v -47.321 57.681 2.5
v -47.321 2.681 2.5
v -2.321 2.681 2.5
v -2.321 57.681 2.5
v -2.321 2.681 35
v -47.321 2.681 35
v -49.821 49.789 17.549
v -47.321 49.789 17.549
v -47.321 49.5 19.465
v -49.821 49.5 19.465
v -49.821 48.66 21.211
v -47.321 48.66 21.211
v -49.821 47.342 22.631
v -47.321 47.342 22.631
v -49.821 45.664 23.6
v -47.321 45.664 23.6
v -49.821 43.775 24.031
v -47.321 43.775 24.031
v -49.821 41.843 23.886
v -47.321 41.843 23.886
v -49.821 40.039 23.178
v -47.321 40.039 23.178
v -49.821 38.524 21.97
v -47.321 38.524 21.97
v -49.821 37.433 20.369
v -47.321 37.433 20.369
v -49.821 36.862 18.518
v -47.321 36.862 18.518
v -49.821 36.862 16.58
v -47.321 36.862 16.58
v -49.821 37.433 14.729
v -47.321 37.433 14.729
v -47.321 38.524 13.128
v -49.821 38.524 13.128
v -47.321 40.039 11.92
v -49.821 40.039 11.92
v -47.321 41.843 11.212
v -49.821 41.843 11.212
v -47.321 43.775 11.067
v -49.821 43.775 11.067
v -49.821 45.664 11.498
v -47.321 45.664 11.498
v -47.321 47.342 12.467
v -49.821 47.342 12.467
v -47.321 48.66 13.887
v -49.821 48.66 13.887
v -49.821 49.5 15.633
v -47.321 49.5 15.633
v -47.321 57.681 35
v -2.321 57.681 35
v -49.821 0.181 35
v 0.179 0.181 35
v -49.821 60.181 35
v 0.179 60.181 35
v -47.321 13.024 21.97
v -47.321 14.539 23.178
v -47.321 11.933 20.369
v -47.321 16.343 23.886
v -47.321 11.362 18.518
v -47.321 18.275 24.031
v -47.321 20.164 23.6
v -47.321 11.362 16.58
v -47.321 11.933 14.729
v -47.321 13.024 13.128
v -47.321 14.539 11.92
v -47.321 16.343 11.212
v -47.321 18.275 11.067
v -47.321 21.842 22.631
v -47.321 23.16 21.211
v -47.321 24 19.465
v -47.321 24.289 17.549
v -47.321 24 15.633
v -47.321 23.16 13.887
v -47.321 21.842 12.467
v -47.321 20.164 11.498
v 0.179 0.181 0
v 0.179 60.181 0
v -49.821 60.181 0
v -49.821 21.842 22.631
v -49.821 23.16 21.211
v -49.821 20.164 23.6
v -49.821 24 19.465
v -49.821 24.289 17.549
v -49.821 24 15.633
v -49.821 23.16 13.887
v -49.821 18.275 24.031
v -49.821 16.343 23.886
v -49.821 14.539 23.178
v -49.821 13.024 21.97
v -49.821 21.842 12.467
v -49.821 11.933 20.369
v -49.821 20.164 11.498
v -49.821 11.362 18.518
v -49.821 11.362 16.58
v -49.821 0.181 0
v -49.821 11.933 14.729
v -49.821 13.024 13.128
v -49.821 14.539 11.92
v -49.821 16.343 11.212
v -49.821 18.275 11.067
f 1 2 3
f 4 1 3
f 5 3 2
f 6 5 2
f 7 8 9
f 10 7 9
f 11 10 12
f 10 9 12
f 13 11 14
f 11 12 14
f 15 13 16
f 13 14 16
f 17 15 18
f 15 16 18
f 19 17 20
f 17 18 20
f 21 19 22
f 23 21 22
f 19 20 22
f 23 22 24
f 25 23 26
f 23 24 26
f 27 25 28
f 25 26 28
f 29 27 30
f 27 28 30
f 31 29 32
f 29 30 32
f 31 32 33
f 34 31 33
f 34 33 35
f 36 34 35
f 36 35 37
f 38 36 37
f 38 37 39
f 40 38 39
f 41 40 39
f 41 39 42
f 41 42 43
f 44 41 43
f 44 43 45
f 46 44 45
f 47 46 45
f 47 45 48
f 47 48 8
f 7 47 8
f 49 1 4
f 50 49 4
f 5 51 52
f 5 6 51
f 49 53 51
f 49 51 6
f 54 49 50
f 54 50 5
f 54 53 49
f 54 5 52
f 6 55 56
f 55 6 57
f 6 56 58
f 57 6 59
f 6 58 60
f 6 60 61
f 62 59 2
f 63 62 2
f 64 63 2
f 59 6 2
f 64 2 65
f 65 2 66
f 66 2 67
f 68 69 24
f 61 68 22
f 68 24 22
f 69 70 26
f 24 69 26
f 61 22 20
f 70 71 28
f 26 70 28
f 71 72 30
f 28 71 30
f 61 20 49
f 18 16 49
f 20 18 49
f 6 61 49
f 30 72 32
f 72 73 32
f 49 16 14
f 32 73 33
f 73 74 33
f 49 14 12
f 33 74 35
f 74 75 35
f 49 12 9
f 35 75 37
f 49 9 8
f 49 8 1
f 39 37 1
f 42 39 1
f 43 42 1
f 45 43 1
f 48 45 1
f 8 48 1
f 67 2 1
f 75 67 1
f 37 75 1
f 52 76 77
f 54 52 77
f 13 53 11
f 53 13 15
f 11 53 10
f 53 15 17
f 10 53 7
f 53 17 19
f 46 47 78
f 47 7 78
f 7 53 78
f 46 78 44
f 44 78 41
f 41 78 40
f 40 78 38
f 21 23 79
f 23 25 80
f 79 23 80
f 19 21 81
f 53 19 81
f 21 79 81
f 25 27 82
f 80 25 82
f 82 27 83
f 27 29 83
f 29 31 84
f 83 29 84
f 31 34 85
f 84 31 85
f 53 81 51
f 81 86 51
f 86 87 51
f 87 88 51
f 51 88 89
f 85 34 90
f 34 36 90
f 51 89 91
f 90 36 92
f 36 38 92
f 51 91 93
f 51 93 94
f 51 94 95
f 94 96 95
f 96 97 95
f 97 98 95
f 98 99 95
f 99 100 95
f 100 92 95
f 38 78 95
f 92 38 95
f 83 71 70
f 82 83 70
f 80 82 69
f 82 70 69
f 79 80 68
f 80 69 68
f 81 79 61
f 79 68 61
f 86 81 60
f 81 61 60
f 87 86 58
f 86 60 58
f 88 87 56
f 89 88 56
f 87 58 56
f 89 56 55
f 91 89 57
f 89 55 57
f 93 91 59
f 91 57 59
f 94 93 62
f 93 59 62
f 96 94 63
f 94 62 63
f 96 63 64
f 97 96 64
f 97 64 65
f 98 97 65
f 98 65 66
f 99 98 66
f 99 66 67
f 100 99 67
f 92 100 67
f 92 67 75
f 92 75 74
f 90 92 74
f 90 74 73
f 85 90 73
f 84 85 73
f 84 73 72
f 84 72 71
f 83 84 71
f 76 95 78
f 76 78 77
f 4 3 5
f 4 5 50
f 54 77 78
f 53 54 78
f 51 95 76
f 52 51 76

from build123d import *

# Parameters (mm, degrees)
F0_W     = 2.5
F0_H     = 55
F1_DEPTH = 35
F0_W_2   = 45
F2_DEPTH = 2.5
F4_D     = 13
F4_DEPTH = 12
F5_D     = 13
F5_DEPTH = 12


with BuildPart() as f1:
    # F0 (on Top) → F1 (new body)
    with BuildSketch(Plane.XY):
        Polygon((-47.320926, 2.681236), (-49.820926, 2.681236), (-49.820926, 0.181236), (0.179074, 0.181236), (0.179074, 2.681236), (-2.320926, 2.681236), align=None)
        with Locations((-48.570926, 30.181236)):
            Rectangle(F0_W, F0_H)
        Polygon((0.179074, 60.181236), (-49.820926, 60.181236), (-49.820926, 57.681236), (-47.320926, 57.681236), (-2.320926, 57.681236), (0.179074, 57.681236), align=None)
        with Locations((-1.070926, 30.181236)):
            Rectangle(F0_W, F0_H)
    extrude(amount=F1_DEPTH)

    # F0 (on Top) → F2 (join)
    with BuildSketch(Plane.XY):
        with Locations((-24.820926, 30.181236)):
            Rectangle(F0_W_2, F0_H)
    extrude(amount=F2_DEPTH)

    # F4
    with Locations(Plane(origin=(-49.820926, 0, 0), x_dir=(0, -1, 0), z_dir=(-1, 0, 0))):
        with Locations((-43.28923, 17.549016)):
            Hole(F4_D / 2, depth=F4_DEPTH)

    # F5
    with Locations(Plane(origin=(-49.820926, 0, 0), x_dir=(0, -1, 0), z_dir=(-1, 0, 0))):
        with Locations((-17.78923, 17.549016)):
            Hole(F5_D / 2, depth=F5_DEPTH)


solid = f1.part
